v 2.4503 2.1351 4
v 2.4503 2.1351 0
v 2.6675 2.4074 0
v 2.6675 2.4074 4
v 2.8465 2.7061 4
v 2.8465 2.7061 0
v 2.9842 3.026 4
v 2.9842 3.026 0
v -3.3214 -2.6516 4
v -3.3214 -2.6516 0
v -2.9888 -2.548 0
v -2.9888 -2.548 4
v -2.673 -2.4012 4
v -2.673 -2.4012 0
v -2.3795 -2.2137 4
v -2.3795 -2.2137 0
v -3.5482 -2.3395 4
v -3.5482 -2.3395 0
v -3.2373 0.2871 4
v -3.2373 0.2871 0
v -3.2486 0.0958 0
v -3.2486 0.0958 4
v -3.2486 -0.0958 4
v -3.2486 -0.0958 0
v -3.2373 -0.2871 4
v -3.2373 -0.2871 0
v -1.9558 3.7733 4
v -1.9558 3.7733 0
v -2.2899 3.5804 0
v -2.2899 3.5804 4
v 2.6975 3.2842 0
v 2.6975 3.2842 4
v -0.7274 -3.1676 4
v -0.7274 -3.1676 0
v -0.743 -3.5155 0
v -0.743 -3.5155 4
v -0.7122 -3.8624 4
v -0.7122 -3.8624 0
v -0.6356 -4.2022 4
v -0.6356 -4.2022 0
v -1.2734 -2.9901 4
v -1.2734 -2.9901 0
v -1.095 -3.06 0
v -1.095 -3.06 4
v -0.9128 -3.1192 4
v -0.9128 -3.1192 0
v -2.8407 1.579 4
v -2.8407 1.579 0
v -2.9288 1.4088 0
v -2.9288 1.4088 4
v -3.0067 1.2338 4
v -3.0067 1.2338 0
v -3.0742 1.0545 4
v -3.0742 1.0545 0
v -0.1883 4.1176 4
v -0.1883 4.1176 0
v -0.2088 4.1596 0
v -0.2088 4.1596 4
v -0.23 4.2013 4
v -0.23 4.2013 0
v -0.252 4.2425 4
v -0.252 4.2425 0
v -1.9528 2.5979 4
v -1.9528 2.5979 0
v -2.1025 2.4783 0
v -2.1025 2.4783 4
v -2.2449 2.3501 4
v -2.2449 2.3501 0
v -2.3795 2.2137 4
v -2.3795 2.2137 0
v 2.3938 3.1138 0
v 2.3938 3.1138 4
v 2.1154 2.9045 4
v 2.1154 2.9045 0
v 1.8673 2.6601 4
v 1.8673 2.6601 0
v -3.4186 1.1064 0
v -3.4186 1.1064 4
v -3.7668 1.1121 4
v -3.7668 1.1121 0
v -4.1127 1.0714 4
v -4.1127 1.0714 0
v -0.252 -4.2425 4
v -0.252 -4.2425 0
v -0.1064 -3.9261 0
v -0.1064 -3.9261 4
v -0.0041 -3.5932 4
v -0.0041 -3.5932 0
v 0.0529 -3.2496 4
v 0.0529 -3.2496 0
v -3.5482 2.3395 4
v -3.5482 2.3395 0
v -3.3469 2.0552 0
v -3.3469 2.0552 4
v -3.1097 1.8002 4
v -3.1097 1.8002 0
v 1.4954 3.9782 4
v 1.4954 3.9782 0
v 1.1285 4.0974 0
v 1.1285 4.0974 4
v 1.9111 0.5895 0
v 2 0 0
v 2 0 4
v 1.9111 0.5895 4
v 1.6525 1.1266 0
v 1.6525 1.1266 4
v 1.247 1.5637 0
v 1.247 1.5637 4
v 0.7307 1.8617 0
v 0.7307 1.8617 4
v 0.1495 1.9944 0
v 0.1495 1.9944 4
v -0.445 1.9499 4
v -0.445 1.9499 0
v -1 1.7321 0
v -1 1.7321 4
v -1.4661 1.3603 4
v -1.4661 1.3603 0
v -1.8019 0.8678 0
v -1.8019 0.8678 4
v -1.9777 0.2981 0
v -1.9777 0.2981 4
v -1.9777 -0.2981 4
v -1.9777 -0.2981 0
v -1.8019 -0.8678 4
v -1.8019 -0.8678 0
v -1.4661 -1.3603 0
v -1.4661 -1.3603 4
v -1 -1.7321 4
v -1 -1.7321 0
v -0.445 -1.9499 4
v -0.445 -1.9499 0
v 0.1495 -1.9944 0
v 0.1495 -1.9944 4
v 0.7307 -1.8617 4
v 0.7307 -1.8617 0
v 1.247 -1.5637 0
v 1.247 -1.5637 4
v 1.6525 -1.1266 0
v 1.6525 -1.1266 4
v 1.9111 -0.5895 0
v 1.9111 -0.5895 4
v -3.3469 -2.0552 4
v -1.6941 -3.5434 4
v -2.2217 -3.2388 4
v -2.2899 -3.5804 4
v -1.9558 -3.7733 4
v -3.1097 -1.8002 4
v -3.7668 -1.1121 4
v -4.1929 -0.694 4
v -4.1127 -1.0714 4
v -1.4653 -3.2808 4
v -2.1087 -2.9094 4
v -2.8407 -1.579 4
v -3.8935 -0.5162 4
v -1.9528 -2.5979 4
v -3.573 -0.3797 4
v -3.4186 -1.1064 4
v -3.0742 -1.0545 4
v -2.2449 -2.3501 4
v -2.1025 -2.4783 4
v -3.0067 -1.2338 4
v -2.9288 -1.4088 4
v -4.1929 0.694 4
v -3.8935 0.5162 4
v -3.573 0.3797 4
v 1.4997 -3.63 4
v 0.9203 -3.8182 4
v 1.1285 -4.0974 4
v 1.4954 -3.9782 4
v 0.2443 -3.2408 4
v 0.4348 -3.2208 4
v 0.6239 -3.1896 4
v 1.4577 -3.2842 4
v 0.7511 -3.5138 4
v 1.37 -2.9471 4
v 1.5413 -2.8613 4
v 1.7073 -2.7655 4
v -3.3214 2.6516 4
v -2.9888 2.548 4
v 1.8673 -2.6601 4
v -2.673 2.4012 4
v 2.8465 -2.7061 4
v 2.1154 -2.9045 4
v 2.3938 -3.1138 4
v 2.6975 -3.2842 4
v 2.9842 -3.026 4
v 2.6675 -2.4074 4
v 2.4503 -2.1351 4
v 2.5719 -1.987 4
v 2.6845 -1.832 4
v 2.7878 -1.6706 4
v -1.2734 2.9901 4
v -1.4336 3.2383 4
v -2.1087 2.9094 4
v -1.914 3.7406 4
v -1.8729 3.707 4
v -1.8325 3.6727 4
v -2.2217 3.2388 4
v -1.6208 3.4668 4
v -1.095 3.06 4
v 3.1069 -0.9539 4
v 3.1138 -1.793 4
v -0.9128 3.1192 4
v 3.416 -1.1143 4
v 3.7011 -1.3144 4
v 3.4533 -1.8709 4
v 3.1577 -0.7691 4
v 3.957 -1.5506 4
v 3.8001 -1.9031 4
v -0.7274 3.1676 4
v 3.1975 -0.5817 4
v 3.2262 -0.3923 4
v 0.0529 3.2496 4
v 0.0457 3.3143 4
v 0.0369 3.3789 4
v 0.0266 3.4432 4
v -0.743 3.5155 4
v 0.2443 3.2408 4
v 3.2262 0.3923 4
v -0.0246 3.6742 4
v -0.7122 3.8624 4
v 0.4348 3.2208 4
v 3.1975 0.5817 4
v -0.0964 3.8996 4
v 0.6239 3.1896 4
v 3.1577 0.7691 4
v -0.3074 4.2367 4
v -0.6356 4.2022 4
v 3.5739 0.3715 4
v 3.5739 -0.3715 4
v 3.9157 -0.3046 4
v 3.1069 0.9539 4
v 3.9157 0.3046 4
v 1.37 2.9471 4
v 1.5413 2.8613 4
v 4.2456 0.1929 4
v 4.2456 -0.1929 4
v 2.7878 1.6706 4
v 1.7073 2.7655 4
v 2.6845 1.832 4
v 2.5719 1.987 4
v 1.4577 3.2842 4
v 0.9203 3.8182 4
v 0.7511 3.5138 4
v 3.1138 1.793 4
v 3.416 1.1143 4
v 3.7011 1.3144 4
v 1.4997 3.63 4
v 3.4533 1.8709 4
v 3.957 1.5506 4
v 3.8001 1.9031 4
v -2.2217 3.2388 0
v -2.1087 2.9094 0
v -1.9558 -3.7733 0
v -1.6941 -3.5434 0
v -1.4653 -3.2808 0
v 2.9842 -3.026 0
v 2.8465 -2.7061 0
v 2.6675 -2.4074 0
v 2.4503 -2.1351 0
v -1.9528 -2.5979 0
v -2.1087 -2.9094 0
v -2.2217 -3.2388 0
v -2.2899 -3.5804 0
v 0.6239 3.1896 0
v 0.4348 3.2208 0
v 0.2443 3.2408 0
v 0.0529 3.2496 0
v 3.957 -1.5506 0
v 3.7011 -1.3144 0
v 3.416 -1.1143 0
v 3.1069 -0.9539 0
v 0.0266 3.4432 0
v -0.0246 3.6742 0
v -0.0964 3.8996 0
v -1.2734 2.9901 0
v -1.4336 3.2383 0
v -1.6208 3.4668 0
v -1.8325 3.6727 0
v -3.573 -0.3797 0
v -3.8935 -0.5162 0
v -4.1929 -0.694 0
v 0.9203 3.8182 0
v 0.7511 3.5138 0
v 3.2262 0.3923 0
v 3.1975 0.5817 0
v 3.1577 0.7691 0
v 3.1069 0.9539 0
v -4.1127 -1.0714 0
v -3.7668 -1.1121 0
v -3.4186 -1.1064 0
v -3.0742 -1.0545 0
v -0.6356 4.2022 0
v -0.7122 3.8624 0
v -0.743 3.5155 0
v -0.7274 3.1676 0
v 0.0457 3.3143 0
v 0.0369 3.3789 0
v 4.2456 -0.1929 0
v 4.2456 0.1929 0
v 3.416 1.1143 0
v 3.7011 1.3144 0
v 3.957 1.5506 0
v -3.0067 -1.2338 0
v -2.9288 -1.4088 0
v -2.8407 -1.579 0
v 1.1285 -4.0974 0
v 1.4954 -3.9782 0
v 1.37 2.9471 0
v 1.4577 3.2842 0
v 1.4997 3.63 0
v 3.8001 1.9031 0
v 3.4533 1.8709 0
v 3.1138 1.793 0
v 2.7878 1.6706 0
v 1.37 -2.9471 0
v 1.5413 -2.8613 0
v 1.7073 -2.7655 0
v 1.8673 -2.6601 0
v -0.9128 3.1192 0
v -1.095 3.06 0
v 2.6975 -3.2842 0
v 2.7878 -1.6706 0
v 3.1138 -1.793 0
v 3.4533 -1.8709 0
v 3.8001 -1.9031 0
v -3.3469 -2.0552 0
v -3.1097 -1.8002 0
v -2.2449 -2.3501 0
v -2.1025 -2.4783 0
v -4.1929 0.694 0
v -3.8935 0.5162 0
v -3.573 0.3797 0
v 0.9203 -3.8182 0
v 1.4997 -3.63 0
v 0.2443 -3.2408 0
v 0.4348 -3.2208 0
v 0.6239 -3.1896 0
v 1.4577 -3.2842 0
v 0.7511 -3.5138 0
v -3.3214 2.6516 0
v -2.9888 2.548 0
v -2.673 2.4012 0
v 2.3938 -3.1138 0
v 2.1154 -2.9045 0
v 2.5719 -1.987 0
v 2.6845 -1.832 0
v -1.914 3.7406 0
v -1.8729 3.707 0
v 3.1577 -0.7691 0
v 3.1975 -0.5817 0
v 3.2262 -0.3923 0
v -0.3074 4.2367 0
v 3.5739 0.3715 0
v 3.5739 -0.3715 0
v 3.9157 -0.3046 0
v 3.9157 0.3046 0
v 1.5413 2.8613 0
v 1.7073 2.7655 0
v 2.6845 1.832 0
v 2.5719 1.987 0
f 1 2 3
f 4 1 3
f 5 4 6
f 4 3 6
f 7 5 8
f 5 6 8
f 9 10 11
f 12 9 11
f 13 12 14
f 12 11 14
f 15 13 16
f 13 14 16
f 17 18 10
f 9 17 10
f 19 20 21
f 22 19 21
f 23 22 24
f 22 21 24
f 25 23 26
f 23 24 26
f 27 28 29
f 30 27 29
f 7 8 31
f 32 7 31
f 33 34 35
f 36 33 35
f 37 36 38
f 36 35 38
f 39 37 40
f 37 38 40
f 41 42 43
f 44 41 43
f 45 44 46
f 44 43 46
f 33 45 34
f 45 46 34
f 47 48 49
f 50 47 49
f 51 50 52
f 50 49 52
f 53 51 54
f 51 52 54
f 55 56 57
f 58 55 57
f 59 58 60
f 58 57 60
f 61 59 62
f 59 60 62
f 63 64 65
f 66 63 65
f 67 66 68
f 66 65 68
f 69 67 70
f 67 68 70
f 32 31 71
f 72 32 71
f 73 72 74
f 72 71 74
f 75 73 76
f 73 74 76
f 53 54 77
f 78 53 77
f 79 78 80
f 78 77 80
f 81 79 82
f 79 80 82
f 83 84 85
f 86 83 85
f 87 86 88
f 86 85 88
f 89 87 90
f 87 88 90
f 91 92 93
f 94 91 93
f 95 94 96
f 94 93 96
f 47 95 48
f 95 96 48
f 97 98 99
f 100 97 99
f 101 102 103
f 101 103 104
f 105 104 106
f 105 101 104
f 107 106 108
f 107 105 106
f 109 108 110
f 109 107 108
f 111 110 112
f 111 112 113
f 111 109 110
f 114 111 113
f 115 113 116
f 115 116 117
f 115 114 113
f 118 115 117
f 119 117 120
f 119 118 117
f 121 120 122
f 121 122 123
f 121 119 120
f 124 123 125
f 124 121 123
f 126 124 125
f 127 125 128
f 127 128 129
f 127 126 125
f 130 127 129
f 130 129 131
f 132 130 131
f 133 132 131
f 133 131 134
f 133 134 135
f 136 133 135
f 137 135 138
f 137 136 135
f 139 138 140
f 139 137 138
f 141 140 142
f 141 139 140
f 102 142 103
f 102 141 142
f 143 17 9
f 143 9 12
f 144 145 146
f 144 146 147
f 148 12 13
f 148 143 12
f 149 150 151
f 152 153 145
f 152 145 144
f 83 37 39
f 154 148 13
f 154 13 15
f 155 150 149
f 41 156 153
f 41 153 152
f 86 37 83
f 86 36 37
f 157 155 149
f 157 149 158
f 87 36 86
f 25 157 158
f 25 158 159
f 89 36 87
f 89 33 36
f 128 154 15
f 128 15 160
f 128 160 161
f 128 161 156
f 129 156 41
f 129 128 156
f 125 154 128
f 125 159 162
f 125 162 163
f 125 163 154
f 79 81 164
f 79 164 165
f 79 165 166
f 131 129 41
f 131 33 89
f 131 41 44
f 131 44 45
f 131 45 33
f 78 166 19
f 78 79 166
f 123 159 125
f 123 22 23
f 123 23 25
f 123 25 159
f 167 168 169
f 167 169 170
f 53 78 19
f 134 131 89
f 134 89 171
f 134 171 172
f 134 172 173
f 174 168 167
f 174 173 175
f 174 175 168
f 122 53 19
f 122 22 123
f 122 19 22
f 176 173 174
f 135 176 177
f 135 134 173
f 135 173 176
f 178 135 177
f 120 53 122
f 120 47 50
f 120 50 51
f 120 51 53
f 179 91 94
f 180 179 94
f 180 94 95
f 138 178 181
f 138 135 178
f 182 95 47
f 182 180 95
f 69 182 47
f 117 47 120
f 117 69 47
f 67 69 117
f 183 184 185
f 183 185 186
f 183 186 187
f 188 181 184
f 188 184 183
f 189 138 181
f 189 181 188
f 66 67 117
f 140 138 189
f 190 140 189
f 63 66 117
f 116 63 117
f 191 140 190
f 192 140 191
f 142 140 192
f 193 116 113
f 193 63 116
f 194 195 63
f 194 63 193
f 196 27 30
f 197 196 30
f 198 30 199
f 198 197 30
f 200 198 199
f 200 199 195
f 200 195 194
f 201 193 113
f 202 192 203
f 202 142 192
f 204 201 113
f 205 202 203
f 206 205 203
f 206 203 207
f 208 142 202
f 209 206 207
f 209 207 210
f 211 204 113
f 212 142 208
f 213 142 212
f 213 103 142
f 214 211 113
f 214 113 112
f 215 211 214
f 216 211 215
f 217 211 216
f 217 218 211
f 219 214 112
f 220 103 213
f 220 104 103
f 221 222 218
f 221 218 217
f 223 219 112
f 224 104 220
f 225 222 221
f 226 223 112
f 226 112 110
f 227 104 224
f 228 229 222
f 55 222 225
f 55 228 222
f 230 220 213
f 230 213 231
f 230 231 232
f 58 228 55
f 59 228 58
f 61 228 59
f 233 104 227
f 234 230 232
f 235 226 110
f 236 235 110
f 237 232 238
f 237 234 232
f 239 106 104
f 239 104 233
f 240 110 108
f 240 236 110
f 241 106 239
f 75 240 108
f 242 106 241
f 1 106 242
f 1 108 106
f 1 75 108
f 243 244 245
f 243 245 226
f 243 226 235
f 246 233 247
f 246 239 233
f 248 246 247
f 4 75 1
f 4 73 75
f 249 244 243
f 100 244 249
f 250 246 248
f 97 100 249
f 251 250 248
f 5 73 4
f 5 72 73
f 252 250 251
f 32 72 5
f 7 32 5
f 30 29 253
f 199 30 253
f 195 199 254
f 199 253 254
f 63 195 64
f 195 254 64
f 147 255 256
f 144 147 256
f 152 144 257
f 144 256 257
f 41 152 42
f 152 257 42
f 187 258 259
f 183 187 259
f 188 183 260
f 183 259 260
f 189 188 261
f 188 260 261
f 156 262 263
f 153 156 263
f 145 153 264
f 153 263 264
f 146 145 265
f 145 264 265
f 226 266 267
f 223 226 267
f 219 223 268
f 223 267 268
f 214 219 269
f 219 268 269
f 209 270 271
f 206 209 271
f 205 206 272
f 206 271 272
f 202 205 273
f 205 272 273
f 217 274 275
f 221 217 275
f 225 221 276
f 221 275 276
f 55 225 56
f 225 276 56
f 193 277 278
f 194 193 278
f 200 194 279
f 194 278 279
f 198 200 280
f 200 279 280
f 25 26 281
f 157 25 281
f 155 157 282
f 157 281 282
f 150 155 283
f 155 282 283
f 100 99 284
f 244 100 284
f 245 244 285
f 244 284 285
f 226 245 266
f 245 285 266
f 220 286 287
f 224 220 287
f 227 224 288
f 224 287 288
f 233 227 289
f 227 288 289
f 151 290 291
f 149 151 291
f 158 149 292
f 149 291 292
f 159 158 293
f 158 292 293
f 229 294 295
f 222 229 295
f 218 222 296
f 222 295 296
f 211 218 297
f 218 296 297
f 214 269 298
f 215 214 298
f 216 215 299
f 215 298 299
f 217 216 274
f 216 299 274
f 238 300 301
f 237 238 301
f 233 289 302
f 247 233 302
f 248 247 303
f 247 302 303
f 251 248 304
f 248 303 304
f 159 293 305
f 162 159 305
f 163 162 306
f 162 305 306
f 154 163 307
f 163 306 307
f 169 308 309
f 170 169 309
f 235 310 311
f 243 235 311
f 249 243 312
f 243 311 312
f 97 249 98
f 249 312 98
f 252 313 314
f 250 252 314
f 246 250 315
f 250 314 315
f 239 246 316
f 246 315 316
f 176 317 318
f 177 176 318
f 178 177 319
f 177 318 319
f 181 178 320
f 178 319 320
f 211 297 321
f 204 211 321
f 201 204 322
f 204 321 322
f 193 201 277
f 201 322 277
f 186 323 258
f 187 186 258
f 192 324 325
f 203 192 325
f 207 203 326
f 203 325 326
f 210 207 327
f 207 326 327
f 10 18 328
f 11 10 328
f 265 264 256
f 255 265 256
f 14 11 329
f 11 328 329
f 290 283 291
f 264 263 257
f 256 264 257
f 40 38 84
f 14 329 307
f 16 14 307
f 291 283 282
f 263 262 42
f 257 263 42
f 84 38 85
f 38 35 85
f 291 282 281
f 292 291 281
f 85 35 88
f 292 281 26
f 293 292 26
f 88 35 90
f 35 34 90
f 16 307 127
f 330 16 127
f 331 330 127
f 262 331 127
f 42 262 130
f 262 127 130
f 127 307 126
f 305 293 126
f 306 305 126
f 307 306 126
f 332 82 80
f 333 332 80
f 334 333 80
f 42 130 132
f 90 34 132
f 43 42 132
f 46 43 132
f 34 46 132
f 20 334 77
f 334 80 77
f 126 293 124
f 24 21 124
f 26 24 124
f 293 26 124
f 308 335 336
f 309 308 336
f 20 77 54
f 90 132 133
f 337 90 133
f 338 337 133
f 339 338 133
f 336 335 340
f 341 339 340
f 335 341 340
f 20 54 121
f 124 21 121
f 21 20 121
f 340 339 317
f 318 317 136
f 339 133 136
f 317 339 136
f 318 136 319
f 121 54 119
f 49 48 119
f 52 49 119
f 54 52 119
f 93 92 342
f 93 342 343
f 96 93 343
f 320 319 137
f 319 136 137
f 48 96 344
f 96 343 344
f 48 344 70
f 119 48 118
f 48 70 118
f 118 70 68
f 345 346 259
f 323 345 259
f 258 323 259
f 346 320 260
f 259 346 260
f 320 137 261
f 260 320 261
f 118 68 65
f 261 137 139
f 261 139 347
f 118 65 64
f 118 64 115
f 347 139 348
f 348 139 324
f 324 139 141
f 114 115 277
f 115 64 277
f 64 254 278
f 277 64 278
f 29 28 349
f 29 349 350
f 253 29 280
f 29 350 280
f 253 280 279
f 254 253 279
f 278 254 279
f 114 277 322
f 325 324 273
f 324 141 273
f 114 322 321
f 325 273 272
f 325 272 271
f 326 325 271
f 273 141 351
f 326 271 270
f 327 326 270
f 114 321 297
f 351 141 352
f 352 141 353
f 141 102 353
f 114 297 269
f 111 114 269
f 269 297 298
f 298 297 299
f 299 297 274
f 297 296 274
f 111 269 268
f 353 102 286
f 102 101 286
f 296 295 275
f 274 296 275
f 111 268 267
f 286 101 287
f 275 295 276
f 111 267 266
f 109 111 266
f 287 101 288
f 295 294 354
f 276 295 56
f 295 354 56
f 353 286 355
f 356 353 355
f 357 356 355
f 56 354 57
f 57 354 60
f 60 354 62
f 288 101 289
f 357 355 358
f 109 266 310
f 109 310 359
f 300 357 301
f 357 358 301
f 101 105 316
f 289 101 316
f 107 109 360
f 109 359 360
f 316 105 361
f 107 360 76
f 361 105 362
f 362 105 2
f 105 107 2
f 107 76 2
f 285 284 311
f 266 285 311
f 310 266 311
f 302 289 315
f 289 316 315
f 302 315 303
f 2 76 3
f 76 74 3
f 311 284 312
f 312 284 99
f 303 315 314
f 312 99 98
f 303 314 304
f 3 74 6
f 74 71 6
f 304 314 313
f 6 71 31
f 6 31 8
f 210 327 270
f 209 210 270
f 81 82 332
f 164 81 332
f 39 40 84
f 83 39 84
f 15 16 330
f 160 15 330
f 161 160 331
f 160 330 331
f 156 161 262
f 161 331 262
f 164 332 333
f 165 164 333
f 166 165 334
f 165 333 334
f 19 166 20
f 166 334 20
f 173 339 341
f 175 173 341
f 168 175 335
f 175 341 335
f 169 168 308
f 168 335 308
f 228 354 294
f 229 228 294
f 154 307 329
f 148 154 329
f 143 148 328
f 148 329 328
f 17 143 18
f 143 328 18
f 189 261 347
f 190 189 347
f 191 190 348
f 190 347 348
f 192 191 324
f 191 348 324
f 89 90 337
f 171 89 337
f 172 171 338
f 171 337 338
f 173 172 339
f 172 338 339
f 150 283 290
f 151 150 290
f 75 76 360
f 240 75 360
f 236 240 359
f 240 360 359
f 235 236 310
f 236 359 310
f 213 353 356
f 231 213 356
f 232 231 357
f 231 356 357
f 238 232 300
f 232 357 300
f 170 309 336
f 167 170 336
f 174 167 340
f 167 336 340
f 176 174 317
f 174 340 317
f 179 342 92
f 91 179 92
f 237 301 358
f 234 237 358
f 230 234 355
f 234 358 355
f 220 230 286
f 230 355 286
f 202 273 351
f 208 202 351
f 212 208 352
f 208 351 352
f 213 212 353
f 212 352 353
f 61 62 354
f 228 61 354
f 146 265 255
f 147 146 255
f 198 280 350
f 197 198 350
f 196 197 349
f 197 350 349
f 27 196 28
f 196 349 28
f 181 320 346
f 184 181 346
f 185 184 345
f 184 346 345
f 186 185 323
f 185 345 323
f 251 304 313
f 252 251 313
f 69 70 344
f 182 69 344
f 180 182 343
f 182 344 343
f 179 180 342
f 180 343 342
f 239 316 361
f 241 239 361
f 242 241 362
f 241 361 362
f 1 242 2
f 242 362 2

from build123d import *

# Parameters (mm, degrees)
F1_R     = 2
F2_DEPTH = 4


# Not quite as in the source:
# - a feature names something its author has since deleted; it is built from what else it names


with BuildPart() as f2:
    # F1 (on Top) → F2 (new body)
    with BuildSketch(Plane.XY):
        with BuildLine():
            ThreePointArc((-0.009331824, 3.2499866026), (0.0217852654, 3.2499269841), (0.0529003577, 3.249569441))
            ThreePointArc((0.0529003577, 3.249569441), (0.0415378352, 3.3466273722), (0.0265550076, 3.4431927066))
            ThreePointArc((0.0265550076, 3.4431927066), (0.0136878461, 3.345646772), (-0.009331824, 3.2499866026))
        make_face()
        with BuildLine():
            ThreePointArc((-0.7273678349, 3.1675599494), (-0.3706482634, 3.2287954201), (-0.009331824, 3.2499866026))
            ThreePointArc((-0.009331824, 3.2499866026), (0.0136878461, 3.345646772), (0.0265550076, 3.4431927066))
            ThreePointArc((0.0265550076, 3.4431927066), (-0.0579521884, 3.7877136915), (-0.1883330995, 4.1176182129))
            ThreePointArc((-0.1883330995, 4.1176182129), (-0.2452042442, 4.1798359688), (-0.3074340323, 4.2366939473))
            Line((-0.3074340323, 4.2366939473), (-0.6356215278, 4.2022000516))
            ThreePointArc((-0.6356215278, 4.2022000516), (-0.733410077, 3.6894835779), (-0.7273678349, 3.1675599494))
        make_face()
        with BuildLine():
            ThreePointArc((-0.3074340323, 4.2366939473), (-0.2452042442, 4.1798359688), (-0.1883330995, 4.1176182129))
            ThreePointArc((-0.1883330995, 4.1176182129), (-0.219306435, 4.1804982316), (-0.2519548455, 4.2425250448))
            Line((-0.2519548455, 4.2425250448), (-0.3074340323, 4.2366939473))
        make_face()
        with BuildLine():
            ThreePointArc((3.2262383665, -0.392283064), (3.2440541527, -0.1965010289), (3.25, 0))
            ThreePointArc((3.25, 0), (3.2440541527, 0.1965010289), (3.2262383665, 0.392283064))
            ThreePointArc((3.2262383665, 0.392283064), (3.1789797024, 0.6757129952), (3.1068713016, 0.9538609518))
            ThreePointArc((3.1068713016, 0.9538609518), (2.9690227373, 1.32189409), (2.7877595085, 1.6705977742))
            ThreePointArc((2.7877595085, 1.6705977742), (2.6293052317, 1.91030207), (2.4502979636, 2.1350737434))
            ThreePointArc((2.4502979636, 2.1350737434), (2.1746744707, 2.4152206828), (1.8672517054, 2.6600509523))
            ThreePointArc((1.8672517054, 2.6600509523), (1.625, 2.8145825623), (1.3700458474, 2.9471128883))
            ThreePointArc((1.3700458474, 2.9471128883), (1.0043052317, 3.090933678), (0.623879119, 3.189557155))
            ThreePointArc((0.623879119, 3.189557155), (0.3397175056, 3.2321961599), (0.0529003577, 3.249569441))
            ThreePointArc((0.0529003577, 3.249569441), (0.0217852654, 3.2499269841), (-0.009331824, 3.2499866026))
            ThreePointArc((-0.009331824, 3.2499866026), (-0.673671928, 2.6091227037), (-1.565226307, 2.8482567665))
            ThreePointArc((-1.565226307, 2.8482567665), (-1.7634860259, 2.7299481747), (-1.9528462821, 2.5978628521))
            ThreePointArc((-1.9528462821, 2.5978628521), (-2.1746744707, 2.4152206828), (-2.3795034667, 2.2136989976))
            ThreePointArc((-2.3795034667, 2.2136989976), (-2.6293052317, 1.91030207), (-2.8406598662, 1.5789716669))
            ThreePointArc((-2.8406598662, 1.5789716669), (-2.9690227373, 1.32189409), (-3.0741770825, 1.0544834116))
            ThreePointArc((-3.0741770825, 1.0544834116), (-3.1789797024, 0.6757129952), (-3.2372975527, 0.287061936))
            ThreePointArc((-3.2372975527, 0.287061936), (-3.25, 0), (-3.2372975527, -0.287061936))
            ThreePointArc((-3.2372975527, -0.287061936), (-3.1789797024, -0.6757129952), (-3.0741770825, -1.0544834116))
            ThreePointArc((-3.0741770825, -1.0544834116), (-2.9690227373, -1.32189409), (-2.8406598662, -1.5789716669))
            ThreePointArc((-2.8406598662, -1.5789716669), (-2.6293052317, -1.91030207), (-2.3795034667, -2.2136989976))
            ThreePointArc((-2.3795034667, -2.2136989976), (-2.1746744707, -2.4152206828), (-1.9528462821, -2.5978628521))
            ThreePointArc((-1.9528462821, -2.5978628521), (-1.625, -2.8145825623), (-1.2733920844, -2.9901459161))
            ThreePointArc((-1.2733920844, -2.9901459161), (-1.0043052317, -3.090933678), (-0.7273678349, -3.1675599494))
            ThreePointArc((-0.7273678349, -3.1675599494), (-0.3397175056, -3.2321961599), (0.0529003577, -3.249569441))
            ThreePointArc((0.0529003577, -3.249569441), (0.3397175056, -3.2321961599), (0.623879119, -3.189557155))
            ThreePointArc((0.623879119, -3.189557155), (1.0043052317, -3.090933678), (1.3700458474, -2.9471128883))
            ThreePointArc((1.3700458474, -2.9471128883), (1.625, -2.8145825623), (1.8672517054, -2.6600509523))
            ThreePointArc((1.8672517054, -2.6600509523), (2.1746744707, -2.4152206828), (2.4502979636, -2.1350737434))
            ThreePointArc((2.4502979636, -2.1350737434), (2.6293052317, -1.91030207), (2.7877595085, -1.6705977742))
            ThreePointArc((2.7877595085, -1.6705977742), (2.9690227373, -1.32189409), (3.1068713016, -0.9538609518))
            ThreePointArc((3.1068713016, -0.9538609518), (3.1789797024, -0.6757129952), (3.2262383665, -0.392283064))
        make_face()
        Circle(F1_R, mode=Mode.SUBTRACT)
        with BuildLine():
            ThreePointArc((-1.8325056355, 3.6726799025), (-1.7998502093, 3.2277290794), (-1.565226307, 2.8482567665))
            ThreePointArc((-1.565226307, 2.8482567665), (-1.4210811819, 2.9228459204), (-1.2733920844, 2.9901459161))
            ThreePointArc((-1.2733920844, 2.9901459161), (-1.5239397604, 3.3551763863), (-1.8325056355, 3.6726799025))
        make_face()
        with BuildLine():
            ThreePointArc((-1.9528462821, 2.5978628521), (-1.7634860259, 2.7299481747), (-1.565226307, 2.8482567665))
            ThreePointArc((-1.565226307, 2.8482567665), (-1.7998502093, 3.2277290794), (-1.8325056355, 3.6726799025))
            ThreePointArc((-1.8325056355, 3.6726799025), (-1.893368674, 3.7239080781), (-1.9557625995, 3.7732602156))
            Line((-1.9557625995, 3.7732602156), (-2.289857902, 3.5803702027))
            ThreePointArc((-2.289857902, 3.5803702027), (-2.1706516096, 3.0722062109), (-1.9528462821, 2.5978628521))
        make_face()
        with BuildLine():
            ThreePointArc((-2.8406598662, 1.5789716669), (-2.6293052317, 1.91030207), (-2.3795034667, 2.2136989976))
            ThreePointArc((-2.3795034667, 2.2136989976), (-2.8284814668, 2.4798935471), (-3.3214012325, 2.651564416))
            Line((-3.3214012325, 2.651564416), (-3.5481570423, 2.3394618192))
            ThreePointArc((-3.5481570423, 2.3394618192), (-3.2325677592, 1.9237164799), (-2.8406598662, 1.5789716669))
        make_face()
        with BuildLine():
            ThreePointArc((-3.2372975527, 0.287061936), (-3.1789797024, 0.6757129952), (-3.0741770825, 1.0544834116))
            ThreePointArc((-3.0741770825, 1.0544834116), (-3.5926099725, 1.1150484286), (-4.1127394185, 1.0713890403))
            Line((-4.1127394185, 1.0713890403), (-4.1929475959, 0.6940392338))
            ThreePointArc((-4.1929475959, 0.6940392338), (-3.7355435762, 0.4425986931), (-3.2372975527, 0.287061936))
        make_face()
        with BuildLine():
            ThreePointArc((-4.1127394185, -1.0713890403), (-3.5926099725, -1.1150484286), (-3.0741770825, -1.0544834116))
            ThreePointArc((-3.0741770825, -1.0544834116), (-3.1789797024, -0.6757129952), (-3.2372975527, -0.287061936))
            ThreePointArc((-3.2372975527, -0.287061936), (-3.7355435762, -0.4425986931), (-4.1929475959, -0.6940392338))
            Line((-4.1929475959, -0.6940392338), (-4.1127394185, -1.0713890403))
        make_face()
        with BuildLine():
            ThreePointArc((-3.3214012325, -2.651564416), (-2.8284814668, -2.4798935471), (-2.3795034667, -2.2136989976))
            ThreePointArc((-2.3795034667, -2.2136989976), (-2.6293052317, -1.91030207), (-2.8406598662, -1.5789716669))
            ThreePointArc((-2.8406598662, -1.5789716669), (-3.2325677592, -1.9237164799), (-3.5481570423, -2.3394618192))
            Line((-3.5481570423, -2.3394618192), (-3.3214012325, -2.651564416))
        make_face()
        with BuildLine():
            ThreePointArc((-1.9557625995, -3.7732602156), (-1.5752828195, -3.4159425422), (-1.2733920844, -2.9901459161))
            ThreePointArc((-1.2733920844, -2.9901459161), (-1.625, -2.8145825623), (-1.9528462821, -2.5978628521))
            ThreePointArc((-1.9528462821, -2.5978628521), (-2.1706516096, -3.0722062109), (-2.289857902, -3.5803702027))
            Line((-2.289857902, -3.5803702027), (-1.9557625995, -3.7732602156))
        make_face()
        with BuildLine():
            ThreePointArc((-0.2519548455, -4.2425250448), (-0.0497034617, -3.7613440389), (0.0529003577, -3.249569441))
            ThreePointArc((0.0529003577, -3.249569441), (-0.3397175056, -3.2321961599), (-0.7273678349, -3.1675599494))
            ThreePointArc((-0.7273678349, -3.1675599494), (-0.733410077, -3.6894835779), (-0.6356215278, -4.2022000516))
            Line((-0.6356215278, -4.2022000516), (-0.2519548455, -4.2425250448))
        make_face()
        with BuildLine():
            ThreePointArc((1.4954181903, -3.9782187517), (1.4844700761, -3.4563749805), (1.3700458474, -2.9471128883))
            ThreePointArc((1.3700458474, -2.9471128883), (1.0043052317, -3.090933678), (0.623879119, -3.189557155))
            ThreePointArc((0.623879119, -3.189557155), (0.8306447207, -3.6688157164), (1.128519583, -4.0974313357))
            Line((1.128519583, -4.0974313357), (1.4954181903, -3.9782187517))
        make_face()
        with BuildLine():
            ThreePointArc((2.9842198355, -3.0260422954), (2.7619652518, -2.5537672878), (2.4502979636, -2.1350737434))
            ThreePointArc((2.4502979636, -2.1350737434), (2.1746744707, -2.4152206828), (1.8672517054, -2.6600509523))
            ThreePointArc((1.8672517054, -2.6600509523), (2.2510735, -3.0137762873), (2.6975294056, -3.2841795179))
            Line((2.6975294056, -3.2841795179), (2.9842198355, -3.0260422954))
        make_face()
        with BuildLine():
            ThreePointArc((3.9570227603, -1.5506356355), (3.5618915438, -1.2095900308), (3.1068713016, -0.9538609518))
            ThreePointArc((3.1068713016, -0.9538609518), (2.9690227373, -1.32189409), (2.7877595085, -1.6705977742))
            ThreePointArc((2.7877595085, -1.6705977742), (3.2822712209, -1.8376275589), (3.8001118877, -1.9030632256))
            Line((3.8001118877, -1.9030632256), (3.9570227603, -1.5506356355))
        make_face()
        with BuildLine():
            ThreePointArc((3.2262383665, 0.392283064), (3.2440541527, 0.1965010289), (3.25, 0))
            ThreePointArc((3.25, 0), (3.2440541527, -0.1965010289), (3.2262383665, -0.392283064))
            ThreePointArc((3.2262383665, -0.392283064), (3.7459344291, -0.3437363313), (4.2456205015, -0.1928900128))
            Line((4.2456205015, -0.1928900128), (4.2456205015, 0.1928900128))
            ThreePointArc((4.2456205015, 0.1928900128), (3.7459344291, 0.3437363313), (3.2262383665, 0.392283064))
        make_face()
        with BuildLine():
            ThreePointArc((2.7877595085, 1.6705977742), (2.9690227373, 1.32189409), (3.1068713016, 0.9538609518))
            ThreePointArc((3.1068713016, 0.9538609518), (3.5618915438, 1.2095900308), (3.9570227603, 1.5506356355))
            Line((3.9570227603, 1.5506356355), (3.8001118877, 1.9030632256))
            ThreePointArc((3.8001118877, 1.9030632256), (3.2822712209, 1.8376275589), (2.7877595085, 1.6705977742))
        make_face()
        with BuildLine():
            ThreePointArc((1.8672517054, 2.6600509523), (2.1746744707, 2.4152206828), (2.4502979636, 2.1350737434))
            ThreePointArc((2.4502979636, 2.1350737434), (2.7619652518, 2.5537672878), (2.9842198355, 3.0260422954))
            Line((2.9842198355, 3.0260422954), (2.6975294056, 3.2841795179))
            ThreePointArc((2.6975294056, 3.2841795179), (2.2510735, 3.0137762873), (1.8672517054, 2.6600509523))
        make_face()
        with BuildLine():
            ThreePointArc((0.623879119, 3.189557155), (1.0043052317, 3.090933678), (1.3700458474, 2.9471128883))
            ThreePointArc((1.3700458474, 2.9471128883), (1.4844700761, 3.4563749805), (1.4954181903, 3.9782187517))
            Line((1.4954181903, 3.9782187517), (1.128519583, 4.0974313357))
            ThreePointArc((1.128519583, 4.0974313357), (0.8306447207, 3.6688157164), (0.623879119, 3.189557155))
        make_face()
        with BuildLine():
            ThreePointArc((-1.565226307, 2.8482567665), (-0.673671928, 2.6091227037), (-0.009331824, 3.2499866026))
            ThreePointArc((-0.009331824, 3.2499866026), (-0.3706482634, 3.2287954201), (-0.7273678349, 3.1675599494))
            ThreePointArc((-0.7273678349, 3.1675599494), (-1.0043052317, 3.090933678), (-1.2733920844, 2.9901459161))
            ThreePointArc((-1.2733920844, 2.9901459161), (-1.4210811819, 2.9228459204), (-1.565226307, 2.8482567665))
        make_face()
    extrude(amount=F2_DEPTH)


solid = f2.part
